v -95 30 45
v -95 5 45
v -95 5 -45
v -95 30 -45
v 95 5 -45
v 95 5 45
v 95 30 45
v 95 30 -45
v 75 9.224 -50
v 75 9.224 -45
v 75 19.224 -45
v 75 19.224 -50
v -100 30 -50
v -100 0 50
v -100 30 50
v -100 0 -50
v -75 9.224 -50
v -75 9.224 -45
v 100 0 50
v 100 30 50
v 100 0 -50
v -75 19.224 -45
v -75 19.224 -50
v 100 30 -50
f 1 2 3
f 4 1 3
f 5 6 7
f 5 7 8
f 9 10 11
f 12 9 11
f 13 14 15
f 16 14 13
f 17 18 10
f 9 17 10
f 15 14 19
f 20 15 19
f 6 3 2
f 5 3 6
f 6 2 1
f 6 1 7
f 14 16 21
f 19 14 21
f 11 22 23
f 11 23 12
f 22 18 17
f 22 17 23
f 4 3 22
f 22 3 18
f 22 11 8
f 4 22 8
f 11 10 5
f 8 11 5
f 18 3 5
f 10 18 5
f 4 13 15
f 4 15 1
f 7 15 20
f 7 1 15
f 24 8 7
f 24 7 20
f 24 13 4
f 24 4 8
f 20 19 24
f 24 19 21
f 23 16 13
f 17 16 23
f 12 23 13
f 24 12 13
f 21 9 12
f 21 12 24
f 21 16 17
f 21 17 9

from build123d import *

# Parameters (mm, degrees)
SKETCH2_W           = 200
SKETCH2_H           = 100
BOSS_EXTRUDE1_DEPTH = 30
SHELL1_T            = -5
SKETCH3_W           = 150
SKETCH3_H           = 10
CUT_EXTRUDE1_DEPTH  = 10


with BuildPart() as part:
    # Sketch2 → Boss-Extrude1 (new body)
    with BuildSketch(Plane(origin=(0, 0, 0), x_dir=(1, 0, 0), z_dir=(0, 1, 0))):
        Rectangle(SKETCH2_W, SKETCH2_H)
    extrude(amount=BOSS_EXTRUDE1_DEPTH)

    # Shell1
    shell1_openings = [part.faces().sort_by_distance(p)[0] for p in [
        (0, 30, 0),
    ]]
    offset(amount=SHELL1_T, openings=shell1_openings, kind=Kind.INTERSECTION)

    # Sketch3 → Cut-Extrude1 (cut)
    with BuildSketch(Plane.XY.offset(-45)):
        with Locations((0, 14.223574028)):
            Rectangle(SKETCH3_W, SKETCH3_H)
    extrude(amount=-CUT_EXTRUDE1_DEPTH, mode=Mode.SUBTRACT)


solid = part.part
